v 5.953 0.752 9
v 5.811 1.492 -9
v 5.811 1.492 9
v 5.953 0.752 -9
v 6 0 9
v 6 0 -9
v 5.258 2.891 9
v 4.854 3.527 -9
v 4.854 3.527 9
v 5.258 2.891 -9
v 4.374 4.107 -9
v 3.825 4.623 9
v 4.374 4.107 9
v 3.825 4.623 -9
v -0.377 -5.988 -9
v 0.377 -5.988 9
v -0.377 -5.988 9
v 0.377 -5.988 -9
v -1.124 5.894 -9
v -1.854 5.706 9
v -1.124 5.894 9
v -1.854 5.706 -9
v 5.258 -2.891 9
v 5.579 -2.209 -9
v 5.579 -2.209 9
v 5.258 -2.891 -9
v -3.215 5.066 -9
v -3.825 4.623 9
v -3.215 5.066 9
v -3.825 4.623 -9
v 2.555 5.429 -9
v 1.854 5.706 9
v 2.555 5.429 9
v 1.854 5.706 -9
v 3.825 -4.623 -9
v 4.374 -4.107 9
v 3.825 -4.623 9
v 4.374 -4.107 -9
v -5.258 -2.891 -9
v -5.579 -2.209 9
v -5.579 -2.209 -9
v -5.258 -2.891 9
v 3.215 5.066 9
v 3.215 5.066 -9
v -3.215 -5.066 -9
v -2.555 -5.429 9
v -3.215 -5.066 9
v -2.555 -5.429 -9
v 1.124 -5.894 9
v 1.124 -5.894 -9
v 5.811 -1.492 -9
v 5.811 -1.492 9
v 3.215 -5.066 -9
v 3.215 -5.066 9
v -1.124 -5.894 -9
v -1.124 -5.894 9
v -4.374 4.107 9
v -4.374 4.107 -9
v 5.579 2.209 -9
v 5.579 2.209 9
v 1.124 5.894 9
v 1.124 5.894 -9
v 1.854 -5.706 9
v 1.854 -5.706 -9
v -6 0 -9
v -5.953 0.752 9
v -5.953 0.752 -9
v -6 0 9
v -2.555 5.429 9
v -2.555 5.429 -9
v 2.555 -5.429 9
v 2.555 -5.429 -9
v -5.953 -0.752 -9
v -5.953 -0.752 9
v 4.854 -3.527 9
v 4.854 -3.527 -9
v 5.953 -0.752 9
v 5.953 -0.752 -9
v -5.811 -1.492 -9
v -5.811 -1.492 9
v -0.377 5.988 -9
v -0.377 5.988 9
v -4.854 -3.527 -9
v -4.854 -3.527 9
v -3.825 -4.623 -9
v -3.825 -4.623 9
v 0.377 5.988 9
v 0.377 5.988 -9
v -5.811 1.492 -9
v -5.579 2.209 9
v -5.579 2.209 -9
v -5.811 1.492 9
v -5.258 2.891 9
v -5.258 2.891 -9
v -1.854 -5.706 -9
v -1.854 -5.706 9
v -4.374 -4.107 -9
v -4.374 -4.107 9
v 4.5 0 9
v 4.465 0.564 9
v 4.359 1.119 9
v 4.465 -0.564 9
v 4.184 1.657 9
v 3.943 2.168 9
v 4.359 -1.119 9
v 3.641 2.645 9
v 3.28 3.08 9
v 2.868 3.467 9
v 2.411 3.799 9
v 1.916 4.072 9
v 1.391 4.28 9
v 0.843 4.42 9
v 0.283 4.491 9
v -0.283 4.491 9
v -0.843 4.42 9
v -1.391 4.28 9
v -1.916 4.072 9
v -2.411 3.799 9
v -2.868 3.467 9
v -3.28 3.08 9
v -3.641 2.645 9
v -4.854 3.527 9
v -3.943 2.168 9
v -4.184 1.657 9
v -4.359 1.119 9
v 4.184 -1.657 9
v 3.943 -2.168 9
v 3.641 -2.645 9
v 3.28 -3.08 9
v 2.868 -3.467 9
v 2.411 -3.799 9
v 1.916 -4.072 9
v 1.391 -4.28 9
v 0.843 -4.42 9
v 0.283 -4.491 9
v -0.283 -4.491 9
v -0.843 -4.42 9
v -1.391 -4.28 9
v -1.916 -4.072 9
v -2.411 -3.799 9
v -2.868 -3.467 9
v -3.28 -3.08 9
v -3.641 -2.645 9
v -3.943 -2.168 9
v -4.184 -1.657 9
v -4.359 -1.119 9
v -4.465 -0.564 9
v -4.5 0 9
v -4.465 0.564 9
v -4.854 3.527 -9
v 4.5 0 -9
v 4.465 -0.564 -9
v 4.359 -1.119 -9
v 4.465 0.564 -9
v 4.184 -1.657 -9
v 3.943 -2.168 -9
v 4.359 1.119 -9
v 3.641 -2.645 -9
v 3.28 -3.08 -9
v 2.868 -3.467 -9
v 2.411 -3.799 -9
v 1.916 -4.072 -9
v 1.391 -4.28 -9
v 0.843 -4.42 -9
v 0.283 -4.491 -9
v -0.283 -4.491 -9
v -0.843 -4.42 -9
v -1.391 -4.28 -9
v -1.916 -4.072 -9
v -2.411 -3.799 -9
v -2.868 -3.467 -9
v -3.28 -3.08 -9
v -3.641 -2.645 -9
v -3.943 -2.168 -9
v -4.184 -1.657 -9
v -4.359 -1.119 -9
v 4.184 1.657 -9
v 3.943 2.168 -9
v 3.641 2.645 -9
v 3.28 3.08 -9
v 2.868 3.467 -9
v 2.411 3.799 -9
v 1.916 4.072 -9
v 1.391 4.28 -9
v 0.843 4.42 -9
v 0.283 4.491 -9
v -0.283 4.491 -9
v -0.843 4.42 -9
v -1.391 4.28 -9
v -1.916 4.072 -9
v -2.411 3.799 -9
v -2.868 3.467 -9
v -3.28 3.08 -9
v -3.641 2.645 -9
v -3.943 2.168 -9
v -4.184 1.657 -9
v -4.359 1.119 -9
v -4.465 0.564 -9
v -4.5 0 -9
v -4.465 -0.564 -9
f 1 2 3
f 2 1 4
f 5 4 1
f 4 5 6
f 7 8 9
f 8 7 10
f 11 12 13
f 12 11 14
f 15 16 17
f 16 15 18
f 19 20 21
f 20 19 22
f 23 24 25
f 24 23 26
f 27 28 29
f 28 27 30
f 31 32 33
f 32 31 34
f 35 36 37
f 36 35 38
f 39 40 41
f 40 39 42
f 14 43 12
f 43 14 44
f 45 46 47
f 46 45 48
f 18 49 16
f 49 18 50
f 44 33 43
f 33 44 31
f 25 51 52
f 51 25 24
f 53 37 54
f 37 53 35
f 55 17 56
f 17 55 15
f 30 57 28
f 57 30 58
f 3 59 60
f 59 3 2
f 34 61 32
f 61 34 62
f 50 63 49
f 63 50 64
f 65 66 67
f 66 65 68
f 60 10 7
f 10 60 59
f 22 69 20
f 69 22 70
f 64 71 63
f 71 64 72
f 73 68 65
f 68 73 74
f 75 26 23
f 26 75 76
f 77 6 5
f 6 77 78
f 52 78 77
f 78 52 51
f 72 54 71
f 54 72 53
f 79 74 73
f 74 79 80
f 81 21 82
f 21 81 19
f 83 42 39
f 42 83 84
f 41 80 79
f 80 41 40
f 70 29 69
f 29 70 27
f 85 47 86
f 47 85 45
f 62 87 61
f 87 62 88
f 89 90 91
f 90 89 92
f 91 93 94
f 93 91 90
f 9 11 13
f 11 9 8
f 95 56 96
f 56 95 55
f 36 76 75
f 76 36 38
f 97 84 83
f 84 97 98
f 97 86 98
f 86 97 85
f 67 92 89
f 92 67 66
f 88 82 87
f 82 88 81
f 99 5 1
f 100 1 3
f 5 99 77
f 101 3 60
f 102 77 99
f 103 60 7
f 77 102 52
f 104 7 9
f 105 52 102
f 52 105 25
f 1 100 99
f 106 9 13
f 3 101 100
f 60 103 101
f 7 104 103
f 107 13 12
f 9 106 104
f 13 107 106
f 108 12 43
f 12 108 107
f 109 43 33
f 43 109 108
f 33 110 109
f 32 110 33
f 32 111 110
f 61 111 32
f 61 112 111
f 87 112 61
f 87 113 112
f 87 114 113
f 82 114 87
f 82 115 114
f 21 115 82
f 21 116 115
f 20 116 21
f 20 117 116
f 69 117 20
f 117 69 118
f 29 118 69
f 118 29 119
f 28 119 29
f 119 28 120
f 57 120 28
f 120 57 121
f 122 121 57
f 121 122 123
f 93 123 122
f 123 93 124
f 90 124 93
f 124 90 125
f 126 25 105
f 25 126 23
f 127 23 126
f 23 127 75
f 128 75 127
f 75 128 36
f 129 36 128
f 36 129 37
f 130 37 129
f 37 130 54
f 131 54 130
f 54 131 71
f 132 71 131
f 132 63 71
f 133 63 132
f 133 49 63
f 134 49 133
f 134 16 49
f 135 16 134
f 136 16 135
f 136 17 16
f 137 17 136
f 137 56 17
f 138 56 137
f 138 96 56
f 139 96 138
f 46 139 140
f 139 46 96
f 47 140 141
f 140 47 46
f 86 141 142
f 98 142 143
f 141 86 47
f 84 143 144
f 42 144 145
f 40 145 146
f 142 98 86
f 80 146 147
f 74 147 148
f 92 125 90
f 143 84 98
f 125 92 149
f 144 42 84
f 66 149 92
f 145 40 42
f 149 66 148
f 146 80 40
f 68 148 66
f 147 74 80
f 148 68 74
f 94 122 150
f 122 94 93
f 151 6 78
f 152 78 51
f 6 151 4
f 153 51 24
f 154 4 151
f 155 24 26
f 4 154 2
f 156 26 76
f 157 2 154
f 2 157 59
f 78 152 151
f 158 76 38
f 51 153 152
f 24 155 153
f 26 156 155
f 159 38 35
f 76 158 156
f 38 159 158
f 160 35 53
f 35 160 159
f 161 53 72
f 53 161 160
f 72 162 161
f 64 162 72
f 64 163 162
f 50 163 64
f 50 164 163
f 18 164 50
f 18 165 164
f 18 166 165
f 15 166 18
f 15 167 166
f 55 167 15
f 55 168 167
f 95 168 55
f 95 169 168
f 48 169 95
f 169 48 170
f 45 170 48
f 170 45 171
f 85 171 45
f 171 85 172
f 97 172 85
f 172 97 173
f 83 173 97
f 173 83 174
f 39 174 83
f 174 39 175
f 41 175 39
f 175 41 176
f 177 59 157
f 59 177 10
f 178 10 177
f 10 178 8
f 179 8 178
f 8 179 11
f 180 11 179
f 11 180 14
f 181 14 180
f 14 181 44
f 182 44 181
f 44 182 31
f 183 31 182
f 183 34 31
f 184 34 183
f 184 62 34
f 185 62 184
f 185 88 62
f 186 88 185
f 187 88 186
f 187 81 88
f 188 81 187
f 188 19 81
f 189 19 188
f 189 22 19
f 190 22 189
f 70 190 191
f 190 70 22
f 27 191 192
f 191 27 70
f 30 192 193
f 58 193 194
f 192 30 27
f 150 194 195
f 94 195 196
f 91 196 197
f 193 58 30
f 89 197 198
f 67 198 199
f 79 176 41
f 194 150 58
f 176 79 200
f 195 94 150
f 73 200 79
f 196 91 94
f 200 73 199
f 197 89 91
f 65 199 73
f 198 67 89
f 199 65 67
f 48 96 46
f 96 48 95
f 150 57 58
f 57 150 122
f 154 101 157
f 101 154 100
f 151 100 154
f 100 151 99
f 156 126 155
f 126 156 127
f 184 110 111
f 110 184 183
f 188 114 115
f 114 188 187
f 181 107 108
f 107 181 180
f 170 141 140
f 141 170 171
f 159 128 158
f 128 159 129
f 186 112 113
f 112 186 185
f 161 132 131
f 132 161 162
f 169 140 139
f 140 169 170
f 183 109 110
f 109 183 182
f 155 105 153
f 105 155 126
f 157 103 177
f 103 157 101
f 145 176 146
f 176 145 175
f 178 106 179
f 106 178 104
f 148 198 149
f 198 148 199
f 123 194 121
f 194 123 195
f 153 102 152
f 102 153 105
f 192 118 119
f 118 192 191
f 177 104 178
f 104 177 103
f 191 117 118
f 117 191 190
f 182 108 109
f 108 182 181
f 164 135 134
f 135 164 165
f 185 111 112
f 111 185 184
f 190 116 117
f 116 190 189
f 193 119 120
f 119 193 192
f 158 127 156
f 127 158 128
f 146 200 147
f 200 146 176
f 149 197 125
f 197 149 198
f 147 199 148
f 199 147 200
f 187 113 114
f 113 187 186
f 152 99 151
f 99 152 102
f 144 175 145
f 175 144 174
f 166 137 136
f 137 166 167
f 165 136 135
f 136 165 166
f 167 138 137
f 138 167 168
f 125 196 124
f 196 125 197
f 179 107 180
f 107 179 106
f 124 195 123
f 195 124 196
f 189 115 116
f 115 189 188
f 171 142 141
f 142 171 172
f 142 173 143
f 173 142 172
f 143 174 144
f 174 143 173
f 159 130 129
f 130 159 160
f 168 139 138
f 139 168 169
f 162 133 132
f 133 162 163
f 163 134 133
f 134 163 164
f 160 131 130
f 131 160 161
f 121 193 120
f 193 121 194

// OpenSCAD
$fn = 50;


difference() {
	union() {
		translate(v = [0, 0, -9.0000000000]) {
			cylinder(h = 18, r = 6.0000000000);
		}
	}
	union() {
		translate(v = [0, 0, -100.0000000000]) {
			cylinder(h = 200, r = 4.5000000000);
		}
	}
}
